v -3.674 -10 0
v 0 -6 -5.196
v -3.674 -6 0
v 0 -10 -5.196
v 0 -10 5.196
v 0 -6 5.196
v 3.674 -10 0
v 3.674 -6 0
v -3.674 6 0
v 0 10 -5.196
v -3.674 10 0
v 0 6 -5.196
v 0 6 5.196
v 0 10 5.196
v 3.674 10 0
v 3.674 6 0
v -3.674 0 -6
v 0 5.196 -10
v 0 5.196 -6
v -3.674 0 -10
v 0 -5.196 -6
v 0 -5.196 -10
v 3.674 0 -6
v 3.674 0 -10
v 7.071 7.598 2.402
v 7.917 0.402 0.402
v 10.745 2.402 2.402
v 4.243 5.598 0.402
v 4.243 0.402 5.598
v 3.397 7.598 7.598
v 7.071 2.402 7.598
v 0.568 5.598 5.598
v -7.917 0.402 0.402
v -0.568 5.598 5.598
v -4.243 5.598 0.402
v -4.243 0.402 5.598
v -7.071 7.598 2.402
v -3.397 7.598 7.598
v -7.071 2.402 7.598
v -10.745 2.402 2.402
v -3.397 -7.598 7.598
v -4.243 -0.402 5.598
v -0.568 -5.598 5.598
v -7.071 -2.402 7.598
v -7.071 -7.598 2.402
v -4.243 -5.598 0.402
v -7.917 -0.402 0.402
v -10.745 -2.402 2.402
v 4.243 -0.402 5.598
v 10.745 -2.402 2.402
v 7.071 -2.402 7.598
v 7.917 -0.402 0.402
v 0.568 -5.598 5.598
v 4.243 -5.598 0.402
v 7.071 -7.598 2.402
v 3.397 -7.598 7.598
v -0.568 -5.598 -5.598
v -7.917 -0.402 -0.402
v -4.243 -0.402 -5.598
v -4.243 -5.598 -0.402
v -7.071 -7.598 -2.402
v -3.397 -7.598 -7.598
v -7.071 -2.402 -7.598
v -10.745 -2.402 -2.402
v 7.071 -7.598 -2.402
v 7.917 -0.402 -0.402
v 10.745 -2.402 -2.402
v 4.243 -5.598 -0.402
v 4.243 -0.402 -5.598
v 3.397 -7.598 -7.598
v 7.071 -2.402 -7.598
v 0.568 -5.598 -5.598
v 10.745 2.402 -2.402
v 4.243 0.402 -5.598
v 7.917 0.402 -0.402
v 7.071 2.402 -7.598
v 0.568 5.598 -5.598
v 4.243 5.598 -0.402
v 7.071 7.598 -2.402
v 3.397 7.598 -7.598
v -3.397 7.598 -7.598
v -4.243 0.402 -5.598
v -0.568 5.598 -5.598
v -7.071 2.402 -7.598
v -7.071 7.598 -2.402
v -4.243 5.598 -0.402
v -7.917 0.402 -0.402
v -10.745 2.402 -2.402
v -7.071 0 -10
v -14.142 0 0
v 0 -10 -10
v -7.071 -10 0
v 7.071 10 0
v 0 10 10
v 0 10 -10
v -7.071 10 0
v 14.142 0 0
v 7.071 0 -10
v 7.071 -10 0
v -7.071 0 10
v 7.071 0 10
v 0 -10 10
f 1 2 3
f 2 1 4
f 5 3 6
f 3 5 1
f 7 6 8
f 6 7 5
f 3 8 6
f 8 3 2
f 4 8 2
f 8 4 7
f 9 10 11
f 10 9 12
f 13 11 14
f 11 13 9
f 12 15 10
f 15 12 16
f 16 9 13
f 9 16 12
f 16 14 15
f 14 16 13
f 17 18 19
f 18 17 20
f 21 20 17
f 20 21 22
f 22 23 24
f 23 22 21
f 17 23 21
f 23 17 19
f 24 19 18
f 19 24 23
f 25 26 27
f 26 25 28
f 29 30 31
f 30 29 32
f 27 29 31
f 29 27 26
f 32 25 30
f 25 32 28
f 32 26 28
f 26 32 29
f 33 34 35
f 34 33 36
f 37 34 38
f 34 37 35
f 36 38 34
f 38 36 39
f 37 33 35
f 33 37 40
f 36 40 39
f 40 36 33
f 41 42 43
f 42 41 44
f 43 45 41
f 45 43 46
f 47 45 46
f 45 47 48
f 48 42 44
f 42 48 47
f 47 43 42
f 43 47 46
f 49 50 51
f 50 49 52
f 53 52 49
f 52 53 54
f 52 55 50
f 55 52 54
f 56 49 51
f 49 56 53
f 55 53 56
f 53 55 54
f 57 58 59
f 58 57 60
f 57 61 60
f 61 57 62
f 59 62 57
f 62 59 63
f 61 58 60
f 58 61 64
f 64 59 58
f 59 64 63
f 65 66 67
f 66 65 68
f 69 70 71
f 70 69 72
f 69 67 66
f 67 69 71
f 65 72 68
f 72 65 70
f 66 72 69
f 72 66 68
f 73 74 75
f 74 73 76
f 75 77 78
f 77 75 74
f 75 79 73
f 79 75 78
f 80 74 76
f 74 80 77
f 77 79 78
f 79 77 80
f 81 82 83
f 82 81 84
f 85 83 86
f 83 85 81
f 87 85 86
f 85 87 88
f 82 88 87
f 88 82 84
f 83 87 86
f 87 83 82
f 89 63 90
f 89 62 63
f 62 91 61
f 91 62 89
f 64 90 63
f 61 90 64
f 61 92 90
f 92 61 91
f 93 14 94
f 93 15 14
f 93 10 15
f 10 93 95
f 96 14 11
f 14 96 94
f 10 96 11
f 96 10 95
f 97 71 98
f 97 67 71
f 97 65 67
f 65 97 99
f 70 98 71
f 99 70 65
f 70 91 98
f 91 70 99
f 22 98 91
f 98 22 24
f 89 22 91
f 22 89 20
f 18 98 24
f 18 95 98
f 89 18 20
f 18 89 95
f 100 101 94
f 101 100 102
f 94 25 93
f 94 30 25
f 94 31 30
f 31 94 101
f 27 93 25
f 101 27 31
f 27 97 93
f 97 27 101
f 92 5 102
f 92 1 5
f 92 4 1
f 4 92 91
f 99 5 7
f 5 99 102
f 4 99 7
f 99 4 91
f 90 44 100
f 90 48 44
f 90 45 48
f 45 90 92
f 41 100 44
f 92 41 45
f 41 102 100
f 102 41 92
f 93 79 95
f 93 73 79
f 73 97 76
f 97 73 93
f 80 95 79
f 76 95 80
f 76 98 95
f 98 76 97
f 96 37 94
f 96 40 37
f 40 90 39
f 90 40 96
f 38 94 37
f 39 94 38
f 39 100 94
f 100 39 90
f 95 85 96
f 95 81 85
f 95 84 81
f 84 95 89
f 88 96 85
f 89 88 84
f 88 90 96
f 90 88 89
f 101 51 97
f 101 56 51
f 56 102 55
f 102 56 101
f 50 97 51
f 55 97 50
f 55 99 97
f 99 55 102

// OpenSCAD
/*
Ромбический додекаэдр + крепления.
С настраиваемыми параметрами в программе OpenSCAD.

Программист: Полозков Сергей.
Смена в Сириусе "самозаклинивающиеся структуры" в 2023 году.
*/

//Шаг сетки для решётки из ромбододекаэдров (межцентровое расстояние)
MM_GRID_STEP = 20.0;

//глубина штырька
MM_RHOMBUS_DEPTH = 4.0;
MM_RHOMBUS_INSCRIBE_DIAMETER = 6.0;

//диаметр отвертия (диаметр описанной окружности около многоугольника детализации)
//если диаметр = 0, то отверстий нет, 2.2 = диаметр зубочистки
MM_HOLE_DIAMETER = 2.2;

//такой n-угольник для детализации крепления
HOLE_DETALISATION_IS_N_POLYGON = 24;


CUBE_SIDE = MM_GRID_STEP / sqrt(2);

module m_square_pyramid(square_side = CUBE_SIDE, dz = 0, pyramid_height = CUBE_SIDE * 0.5) {
    translate([0,0,dz])
        rotate(45)
            cylinder(h = pyramid_height, r1 = square_side * 0.5 * sqrt(2), r2 = 0, $fn = 4);
}

module m_rhombus(square_side = CUBE_SIDE, h_depth = MM_RHOMBUS_DEPTH, d_inscribe_in_rhombus = MM_RHOMBUS_INSCRIBE_DIAMETER, h_extra = 1) {
    p4 = [[0,sqrt(2)],[1,0],[0,-sqrt(2)],[-1,0]];
    inscribe_circle_scale = d_inscribe_in_rhombus / 2 / sqrt(2/3);
    
    translate([0,0,square_side / sqrt(2) - h_depth])
        scale([ inscribe_circle_scale,  inscribe_circle_scale, h_depth + h_extra])
             linear_extrude(height = 1, center = false)
                 polygon(p4);
    
    //sphere(d = d_inscribe_in_rhombus, $fn = 60);
}

module m_cylinder_connector(square_side = CUBE_SIDE, h_depth = MM_RHOMBUS_DEPTH, d_inscribe_in_rhombus = MM_RHOMBUS_INSCRIBE_DIAMETER, h_extra = 1) {
    p4 = [[0,sqrt(2)],[1,0],[0,-sqrt(2)],[-1,0]];
    inscribe_circle_scale = d_inscribe_in_rhombus / 2 / sqrt(2/3);
    
    translate([0,0,square_side / sqrt(2) - h_depth])
        scale([ inscribe_circle_scale,  inscribe_circle_scale, h_depth + h_extra])
             linear_extrude(height = 1, center = false)
                 polygon(p4);
    
    //sphere(d = d_inscribe_in_rhombus, $fn = 60);
}

module m_rhombus_rotate(rotate_axe=[0,0,1], rotate_deg=90) {
    rotate(a = rotate_deg, v = rotate_axe)
        m_rhombus();
}

module m_11_rhombus() {
    //m_rhombus_rotate([1,0,0], 0);
    m_rhombus_rotate([1,0,0], 90);
    m_rhombus_rotate([1,0,0], -90);
    m_rhombus_rotate([1,0,0], 180);
    
    m_rhombus_rotate([0,1,1], 90);
    m_rhombus_rotate([0,1,1], -90);
    m_rhombus_rotate([0,-1,1], 90);
    m_rhombus_rotate([0,-1,1], -90);
    
    rotate(a = 90, v = [0,1,1]) m_rhombus_rotate([1,0,0], 180);
    rotate(a = -90, v = [0,1,1]) m_rhombus_rotate([1,0,0], 180);
    rotate(a = 90, v = [0,-1,1]) m_rhombus_rotate([1,0,0], 180);
    rotate(a = -90, v = [0,-1,1]) m_rhombus_rotate([1,0,0], 180);
}

//m_rhombus_rotate([0,0,1], 0);




module m_two_pyramids(square_side = CUBE_SIDE) {
    hull() {
        m_square_pyramid(square_side, square_side * 0.5, square_side * 0.5);
        mirror(v = [0,0,1])
            m_square_pyramid(square_side, square_side * 0.5, square_side * 0.5);
    }
}


module m_ball_12_with_no_holes() {
    hull() {
        rotate ([90,0,0]) m_two_pyramids();
        rotate ([0,90,0]) m_two_pyramids();
        rotate ([0,0,90]) m_two_pyramids();
    }
}

difference() {
    rotate(a = 45, v=[1,0,0]) m_ball_12_with_no_holes();
    m_11_rhombus();
}
